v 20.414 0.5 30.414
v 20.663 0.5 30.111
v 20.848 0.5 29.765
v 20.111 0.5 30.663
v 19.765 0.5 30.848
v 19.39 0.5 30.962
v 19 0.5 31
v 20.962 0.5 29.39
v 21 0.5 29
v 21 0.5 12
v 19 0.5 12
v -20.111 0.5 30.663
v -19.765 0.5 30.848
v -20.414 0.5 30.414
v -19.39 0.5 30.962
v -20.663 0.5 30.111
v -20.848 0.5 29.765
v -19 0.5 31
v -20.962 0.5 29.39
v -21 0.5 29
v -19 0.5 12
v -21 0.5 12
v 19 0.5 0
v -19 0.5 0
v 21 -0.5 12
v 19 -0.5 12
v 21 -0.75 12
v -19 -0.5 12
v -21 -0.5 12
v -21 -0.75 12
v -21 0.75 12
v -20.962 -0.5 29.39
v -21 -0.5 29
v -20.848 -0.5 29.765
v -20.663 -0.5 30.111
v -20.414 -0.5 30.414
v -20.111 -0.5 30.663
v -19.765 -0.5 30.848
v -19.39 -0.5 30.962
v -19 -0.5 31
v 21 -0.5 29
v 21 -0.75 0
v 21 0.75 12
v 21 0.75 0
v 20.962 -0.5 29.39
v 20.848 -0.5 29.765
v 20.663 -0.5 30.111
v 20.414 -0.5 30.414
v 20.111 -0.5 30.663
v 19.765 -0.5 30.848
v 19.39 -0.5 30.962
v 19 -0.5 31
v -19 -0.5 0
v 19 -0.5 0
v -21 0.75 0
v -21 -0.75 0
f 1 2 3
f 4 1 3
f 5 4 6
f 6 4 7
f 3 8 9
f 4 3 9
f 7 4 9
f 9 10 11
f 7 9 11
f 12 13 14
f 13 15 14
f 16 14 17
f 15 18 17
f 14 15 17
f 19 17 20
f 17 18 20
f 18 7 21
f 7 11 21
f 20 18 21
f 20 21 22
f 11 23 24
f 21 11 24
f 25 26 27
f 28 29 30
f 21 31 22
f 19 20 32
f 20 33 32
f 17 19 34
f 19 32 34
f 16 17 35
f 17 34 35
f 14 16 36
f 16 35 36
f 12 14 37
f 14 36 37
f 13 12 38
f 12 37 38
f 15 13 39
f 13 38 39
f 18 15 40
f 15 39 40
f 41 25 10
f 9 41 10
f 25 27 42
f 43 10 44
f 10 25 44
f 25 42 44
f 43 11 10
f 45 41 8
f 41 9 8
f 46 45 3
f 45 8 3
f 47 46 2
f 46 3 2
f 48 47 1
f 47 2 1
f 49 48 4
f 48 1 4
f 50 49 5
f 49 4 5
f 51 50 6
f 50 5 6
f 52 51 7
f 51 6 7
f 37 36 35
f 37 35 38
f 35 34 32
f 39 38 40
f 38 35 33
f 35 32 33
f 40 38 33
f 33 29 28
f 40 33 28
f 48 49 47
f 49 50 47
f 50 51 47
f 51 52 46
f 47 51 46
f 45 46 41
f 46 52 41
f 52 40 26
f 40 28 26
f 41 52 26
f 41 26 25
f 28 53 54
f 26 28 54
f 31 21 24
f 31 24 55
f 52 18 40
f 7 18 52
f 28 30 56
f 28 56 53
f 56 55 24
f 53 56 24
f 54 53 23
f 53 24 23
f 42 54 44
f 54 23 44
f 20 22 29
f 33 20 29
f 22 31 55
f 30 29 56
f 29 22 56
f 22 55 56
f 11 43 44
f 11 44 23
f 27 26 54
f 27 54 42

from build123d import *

# Parameters (mm, degrees)
F2_DEPTH = 31
F3_DEPTH = 12
F4_R     = 2


with BuildPart() as f2:
    # F1 (on Top) → F2 (new body)
    with BuildSketch(Plane.XY):
        Polygon((-19, 0.5), (-21, 0.5), (-21, -0.5), (-19, -0.5), (19, -0.5), (21, -0.5), (21, 0.5), (19, 0.5), align=None)
    extrude(amount=F2_DEPTH)

    # F1 (on Top) → F3 (join)
    with BuildSketch(Plane.XY):
        Polygon((-21, 0.75), (-21, 0.5), (-19, 0.5), align=None)
        Polygon((-19, -0.5), (-21, -0.5), (-21, -0.75), align=None)
        Polygon((21, 0.75), (19, 0.5), (21, 0.5), align=None)
        Polygon((21, -0.5), (19, -0.5), (21, -0.75), align=None)
    extrude(amount=F3_DEPTH)

    # F4
    f4_edges = [f2.edges().sort_by_distance(p)[0] for p in [
        (-21, 0, 31),
        (21, 0, 31),
    ]]
    fillet(f4_edges, radius=F4_R)


solid = f2.part
